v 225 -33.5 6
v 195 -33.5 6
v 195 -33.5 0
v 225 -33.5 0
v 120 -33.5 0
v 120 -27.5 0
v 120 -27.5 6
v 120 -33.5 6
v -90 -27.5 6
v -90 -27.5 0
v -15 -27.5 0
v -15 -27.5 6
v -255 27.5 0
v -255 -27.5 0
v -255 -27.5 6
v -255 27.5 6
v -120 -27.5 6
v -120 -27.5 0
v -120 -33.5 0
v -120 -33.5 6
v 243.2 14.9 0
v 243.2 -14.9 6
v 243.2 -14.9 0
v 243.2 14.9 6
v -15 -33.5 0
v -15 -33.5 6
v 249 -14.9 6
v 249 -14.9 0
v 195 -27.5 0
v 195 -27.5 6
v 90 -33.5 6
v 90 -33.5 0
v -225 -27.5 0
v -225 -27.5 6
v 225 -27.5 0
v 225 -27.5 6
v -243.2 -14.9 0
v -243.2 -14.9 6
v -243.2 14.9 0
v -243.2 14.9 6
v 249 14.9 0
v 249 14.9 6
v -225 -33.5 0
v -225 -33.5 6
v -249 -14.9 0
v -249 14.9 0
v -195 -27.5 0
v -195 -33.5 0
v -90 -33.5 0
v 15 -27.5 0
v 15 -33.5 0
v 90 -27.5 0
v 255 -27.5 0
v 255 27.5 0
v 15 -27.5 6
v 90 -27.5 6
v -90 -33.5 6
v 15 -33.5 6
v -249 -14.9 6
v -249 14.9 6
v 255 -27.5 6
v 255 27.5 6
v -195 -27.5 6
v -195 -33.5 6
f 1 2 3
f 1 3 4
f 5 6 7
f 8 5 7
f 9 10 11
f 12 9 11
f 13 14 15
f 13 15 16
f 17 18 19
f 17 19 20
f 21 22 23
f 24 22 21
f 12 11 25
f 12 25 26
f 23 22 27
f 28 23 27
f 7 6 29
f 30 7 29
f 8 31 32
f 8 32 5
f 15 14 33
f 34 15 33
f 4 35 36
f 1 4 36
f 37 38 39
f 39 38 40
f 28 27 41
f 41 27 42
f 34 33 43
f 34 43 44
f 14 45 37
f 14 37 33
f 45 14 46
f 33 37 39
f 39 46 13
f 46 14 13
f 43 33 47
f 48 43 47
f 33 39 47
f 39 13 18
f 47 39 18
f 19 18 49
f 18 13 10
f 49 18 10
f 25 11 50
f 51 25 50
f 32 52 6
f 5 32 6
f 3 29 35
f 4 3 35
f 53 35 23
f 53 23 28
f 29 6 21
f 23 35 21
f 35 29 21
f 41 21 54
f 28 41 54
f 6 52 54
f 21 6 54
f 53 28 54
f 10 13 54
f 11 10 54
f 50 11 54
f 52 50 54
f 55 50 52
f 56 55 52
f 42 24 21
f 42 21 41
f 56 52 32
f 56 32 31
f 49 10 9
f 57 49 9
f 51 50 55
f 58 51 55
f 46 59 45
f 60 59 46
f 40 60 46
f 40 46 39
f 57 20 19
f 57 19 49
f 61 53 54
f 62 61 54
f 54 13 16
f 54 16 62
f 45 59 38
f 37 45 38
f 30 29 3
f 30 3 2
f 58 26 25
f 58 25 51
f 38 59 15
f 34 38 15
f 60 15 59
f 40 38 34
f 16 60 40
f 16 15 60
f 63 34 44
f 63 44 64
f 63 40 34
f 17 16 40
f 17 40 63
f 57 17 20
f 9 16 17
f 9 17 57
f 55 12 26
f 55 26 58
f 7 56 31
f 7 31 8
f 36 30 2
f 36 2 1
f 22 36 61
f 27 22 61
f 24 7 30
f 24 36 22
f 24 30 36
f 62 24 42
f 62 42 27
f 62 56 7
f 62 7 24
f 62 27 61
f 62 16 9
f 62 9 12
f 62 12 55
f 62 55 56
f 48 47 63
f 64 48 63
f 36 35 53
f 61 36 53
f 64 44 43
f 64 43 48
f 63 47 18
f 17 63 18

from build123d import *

# Parameters (mm, degrees)
CROQUIS1_W              = 510
CROQUIS1_H              = 55
SALIENTE_EXTRUIR1_DEPTH = 6
CORTAR_EXTRUIR1_REACH   = 8
CROQUIS2_W              = 5.8
CROQUIS2_H              = 29.8
CROQUIS3_W              = 30
CROQUIS3_H              = 6
SALIENTE_EXTRUIR2_DEPTH = 6


with BuildPart() as part:
    # Croquis1 → Saliente-Extruir1 (new body)
    with BuildSketch(Plane.XY):
        Rectangle(CROQUIS1_W, CROQUIS1_H)
    extrude(amount=SALIENTE_EXTRUIR1_DEPTH)

    # Croquis2 → Cortar-Extruir1 (cut, up to next)
    with BuildSketch(Plane.XY.offset(6), mode=Mode.PRIVATE) as cortar_extruir1_sk1:
        with Locations((-246.1, 0)):
            Rectangle(CROQUIS2_W, CROQUIS2_H)
    cortar_extruir1_tool1 = extrude(cortar_extruir1_sk1.sketch, amount=-CORTAR_EXTRUIR1_REACH, mode=Mode.PRIVATE) & part.part
    add(cortar_extruir1_tool1.solids().sort_by_distance((-246.1, 0, 6))[0], mode=Mode.SUBTRACT)
    # Croquis2 → Cortar-Extruir1 (cut, up to next)
    with BuildSketch(Plane.XY.offset(6), mode=Mode.PRIVATE) as cortar_extruir1_sk2:
        with Locations((246.1, 0)):
            Rectangle(CROQUIS2_W, CROQUIS2_H)
    cortar_extruir1_tool2 = extrude(cortar_extruir1_sk2.sketch, amount=-CORTAR_EXTRUIR1_REACH, mode=Mode.PRIVATE) & part.part
    add(cortar_extruir1_tool2.solids().sort_by_distance((246.1, 0, 6))[0], mode=Mode.SUBTRACT)

    # Croquis3 → Saliente-Extruir2 (add)
    with BuildSketch(Plane.XZ.offset(27.5)):
        with Locations((0, 3)):
            Rectangle(CROQUIS3_W, CROQUIS3_H)
        with Locations((105, 3)):
            Rectangle(CROQUIS3_W, CROQUIS3_H)
        with Locations((210, 3)):
            Rectangle(CROQUIS3_W, CROQUIS3_H)
        with Locations((-105, 3)):
            Rectangle(CROQUIS3_W, CROQUIS3_H)
        with Locations((-210, 3)):
            Rectangle(CROQUIS3_W, CROQUIS3_H)
    extrude(amount=SALIENTE_EXTRUIR2_DEPTH)


solid = part.part
